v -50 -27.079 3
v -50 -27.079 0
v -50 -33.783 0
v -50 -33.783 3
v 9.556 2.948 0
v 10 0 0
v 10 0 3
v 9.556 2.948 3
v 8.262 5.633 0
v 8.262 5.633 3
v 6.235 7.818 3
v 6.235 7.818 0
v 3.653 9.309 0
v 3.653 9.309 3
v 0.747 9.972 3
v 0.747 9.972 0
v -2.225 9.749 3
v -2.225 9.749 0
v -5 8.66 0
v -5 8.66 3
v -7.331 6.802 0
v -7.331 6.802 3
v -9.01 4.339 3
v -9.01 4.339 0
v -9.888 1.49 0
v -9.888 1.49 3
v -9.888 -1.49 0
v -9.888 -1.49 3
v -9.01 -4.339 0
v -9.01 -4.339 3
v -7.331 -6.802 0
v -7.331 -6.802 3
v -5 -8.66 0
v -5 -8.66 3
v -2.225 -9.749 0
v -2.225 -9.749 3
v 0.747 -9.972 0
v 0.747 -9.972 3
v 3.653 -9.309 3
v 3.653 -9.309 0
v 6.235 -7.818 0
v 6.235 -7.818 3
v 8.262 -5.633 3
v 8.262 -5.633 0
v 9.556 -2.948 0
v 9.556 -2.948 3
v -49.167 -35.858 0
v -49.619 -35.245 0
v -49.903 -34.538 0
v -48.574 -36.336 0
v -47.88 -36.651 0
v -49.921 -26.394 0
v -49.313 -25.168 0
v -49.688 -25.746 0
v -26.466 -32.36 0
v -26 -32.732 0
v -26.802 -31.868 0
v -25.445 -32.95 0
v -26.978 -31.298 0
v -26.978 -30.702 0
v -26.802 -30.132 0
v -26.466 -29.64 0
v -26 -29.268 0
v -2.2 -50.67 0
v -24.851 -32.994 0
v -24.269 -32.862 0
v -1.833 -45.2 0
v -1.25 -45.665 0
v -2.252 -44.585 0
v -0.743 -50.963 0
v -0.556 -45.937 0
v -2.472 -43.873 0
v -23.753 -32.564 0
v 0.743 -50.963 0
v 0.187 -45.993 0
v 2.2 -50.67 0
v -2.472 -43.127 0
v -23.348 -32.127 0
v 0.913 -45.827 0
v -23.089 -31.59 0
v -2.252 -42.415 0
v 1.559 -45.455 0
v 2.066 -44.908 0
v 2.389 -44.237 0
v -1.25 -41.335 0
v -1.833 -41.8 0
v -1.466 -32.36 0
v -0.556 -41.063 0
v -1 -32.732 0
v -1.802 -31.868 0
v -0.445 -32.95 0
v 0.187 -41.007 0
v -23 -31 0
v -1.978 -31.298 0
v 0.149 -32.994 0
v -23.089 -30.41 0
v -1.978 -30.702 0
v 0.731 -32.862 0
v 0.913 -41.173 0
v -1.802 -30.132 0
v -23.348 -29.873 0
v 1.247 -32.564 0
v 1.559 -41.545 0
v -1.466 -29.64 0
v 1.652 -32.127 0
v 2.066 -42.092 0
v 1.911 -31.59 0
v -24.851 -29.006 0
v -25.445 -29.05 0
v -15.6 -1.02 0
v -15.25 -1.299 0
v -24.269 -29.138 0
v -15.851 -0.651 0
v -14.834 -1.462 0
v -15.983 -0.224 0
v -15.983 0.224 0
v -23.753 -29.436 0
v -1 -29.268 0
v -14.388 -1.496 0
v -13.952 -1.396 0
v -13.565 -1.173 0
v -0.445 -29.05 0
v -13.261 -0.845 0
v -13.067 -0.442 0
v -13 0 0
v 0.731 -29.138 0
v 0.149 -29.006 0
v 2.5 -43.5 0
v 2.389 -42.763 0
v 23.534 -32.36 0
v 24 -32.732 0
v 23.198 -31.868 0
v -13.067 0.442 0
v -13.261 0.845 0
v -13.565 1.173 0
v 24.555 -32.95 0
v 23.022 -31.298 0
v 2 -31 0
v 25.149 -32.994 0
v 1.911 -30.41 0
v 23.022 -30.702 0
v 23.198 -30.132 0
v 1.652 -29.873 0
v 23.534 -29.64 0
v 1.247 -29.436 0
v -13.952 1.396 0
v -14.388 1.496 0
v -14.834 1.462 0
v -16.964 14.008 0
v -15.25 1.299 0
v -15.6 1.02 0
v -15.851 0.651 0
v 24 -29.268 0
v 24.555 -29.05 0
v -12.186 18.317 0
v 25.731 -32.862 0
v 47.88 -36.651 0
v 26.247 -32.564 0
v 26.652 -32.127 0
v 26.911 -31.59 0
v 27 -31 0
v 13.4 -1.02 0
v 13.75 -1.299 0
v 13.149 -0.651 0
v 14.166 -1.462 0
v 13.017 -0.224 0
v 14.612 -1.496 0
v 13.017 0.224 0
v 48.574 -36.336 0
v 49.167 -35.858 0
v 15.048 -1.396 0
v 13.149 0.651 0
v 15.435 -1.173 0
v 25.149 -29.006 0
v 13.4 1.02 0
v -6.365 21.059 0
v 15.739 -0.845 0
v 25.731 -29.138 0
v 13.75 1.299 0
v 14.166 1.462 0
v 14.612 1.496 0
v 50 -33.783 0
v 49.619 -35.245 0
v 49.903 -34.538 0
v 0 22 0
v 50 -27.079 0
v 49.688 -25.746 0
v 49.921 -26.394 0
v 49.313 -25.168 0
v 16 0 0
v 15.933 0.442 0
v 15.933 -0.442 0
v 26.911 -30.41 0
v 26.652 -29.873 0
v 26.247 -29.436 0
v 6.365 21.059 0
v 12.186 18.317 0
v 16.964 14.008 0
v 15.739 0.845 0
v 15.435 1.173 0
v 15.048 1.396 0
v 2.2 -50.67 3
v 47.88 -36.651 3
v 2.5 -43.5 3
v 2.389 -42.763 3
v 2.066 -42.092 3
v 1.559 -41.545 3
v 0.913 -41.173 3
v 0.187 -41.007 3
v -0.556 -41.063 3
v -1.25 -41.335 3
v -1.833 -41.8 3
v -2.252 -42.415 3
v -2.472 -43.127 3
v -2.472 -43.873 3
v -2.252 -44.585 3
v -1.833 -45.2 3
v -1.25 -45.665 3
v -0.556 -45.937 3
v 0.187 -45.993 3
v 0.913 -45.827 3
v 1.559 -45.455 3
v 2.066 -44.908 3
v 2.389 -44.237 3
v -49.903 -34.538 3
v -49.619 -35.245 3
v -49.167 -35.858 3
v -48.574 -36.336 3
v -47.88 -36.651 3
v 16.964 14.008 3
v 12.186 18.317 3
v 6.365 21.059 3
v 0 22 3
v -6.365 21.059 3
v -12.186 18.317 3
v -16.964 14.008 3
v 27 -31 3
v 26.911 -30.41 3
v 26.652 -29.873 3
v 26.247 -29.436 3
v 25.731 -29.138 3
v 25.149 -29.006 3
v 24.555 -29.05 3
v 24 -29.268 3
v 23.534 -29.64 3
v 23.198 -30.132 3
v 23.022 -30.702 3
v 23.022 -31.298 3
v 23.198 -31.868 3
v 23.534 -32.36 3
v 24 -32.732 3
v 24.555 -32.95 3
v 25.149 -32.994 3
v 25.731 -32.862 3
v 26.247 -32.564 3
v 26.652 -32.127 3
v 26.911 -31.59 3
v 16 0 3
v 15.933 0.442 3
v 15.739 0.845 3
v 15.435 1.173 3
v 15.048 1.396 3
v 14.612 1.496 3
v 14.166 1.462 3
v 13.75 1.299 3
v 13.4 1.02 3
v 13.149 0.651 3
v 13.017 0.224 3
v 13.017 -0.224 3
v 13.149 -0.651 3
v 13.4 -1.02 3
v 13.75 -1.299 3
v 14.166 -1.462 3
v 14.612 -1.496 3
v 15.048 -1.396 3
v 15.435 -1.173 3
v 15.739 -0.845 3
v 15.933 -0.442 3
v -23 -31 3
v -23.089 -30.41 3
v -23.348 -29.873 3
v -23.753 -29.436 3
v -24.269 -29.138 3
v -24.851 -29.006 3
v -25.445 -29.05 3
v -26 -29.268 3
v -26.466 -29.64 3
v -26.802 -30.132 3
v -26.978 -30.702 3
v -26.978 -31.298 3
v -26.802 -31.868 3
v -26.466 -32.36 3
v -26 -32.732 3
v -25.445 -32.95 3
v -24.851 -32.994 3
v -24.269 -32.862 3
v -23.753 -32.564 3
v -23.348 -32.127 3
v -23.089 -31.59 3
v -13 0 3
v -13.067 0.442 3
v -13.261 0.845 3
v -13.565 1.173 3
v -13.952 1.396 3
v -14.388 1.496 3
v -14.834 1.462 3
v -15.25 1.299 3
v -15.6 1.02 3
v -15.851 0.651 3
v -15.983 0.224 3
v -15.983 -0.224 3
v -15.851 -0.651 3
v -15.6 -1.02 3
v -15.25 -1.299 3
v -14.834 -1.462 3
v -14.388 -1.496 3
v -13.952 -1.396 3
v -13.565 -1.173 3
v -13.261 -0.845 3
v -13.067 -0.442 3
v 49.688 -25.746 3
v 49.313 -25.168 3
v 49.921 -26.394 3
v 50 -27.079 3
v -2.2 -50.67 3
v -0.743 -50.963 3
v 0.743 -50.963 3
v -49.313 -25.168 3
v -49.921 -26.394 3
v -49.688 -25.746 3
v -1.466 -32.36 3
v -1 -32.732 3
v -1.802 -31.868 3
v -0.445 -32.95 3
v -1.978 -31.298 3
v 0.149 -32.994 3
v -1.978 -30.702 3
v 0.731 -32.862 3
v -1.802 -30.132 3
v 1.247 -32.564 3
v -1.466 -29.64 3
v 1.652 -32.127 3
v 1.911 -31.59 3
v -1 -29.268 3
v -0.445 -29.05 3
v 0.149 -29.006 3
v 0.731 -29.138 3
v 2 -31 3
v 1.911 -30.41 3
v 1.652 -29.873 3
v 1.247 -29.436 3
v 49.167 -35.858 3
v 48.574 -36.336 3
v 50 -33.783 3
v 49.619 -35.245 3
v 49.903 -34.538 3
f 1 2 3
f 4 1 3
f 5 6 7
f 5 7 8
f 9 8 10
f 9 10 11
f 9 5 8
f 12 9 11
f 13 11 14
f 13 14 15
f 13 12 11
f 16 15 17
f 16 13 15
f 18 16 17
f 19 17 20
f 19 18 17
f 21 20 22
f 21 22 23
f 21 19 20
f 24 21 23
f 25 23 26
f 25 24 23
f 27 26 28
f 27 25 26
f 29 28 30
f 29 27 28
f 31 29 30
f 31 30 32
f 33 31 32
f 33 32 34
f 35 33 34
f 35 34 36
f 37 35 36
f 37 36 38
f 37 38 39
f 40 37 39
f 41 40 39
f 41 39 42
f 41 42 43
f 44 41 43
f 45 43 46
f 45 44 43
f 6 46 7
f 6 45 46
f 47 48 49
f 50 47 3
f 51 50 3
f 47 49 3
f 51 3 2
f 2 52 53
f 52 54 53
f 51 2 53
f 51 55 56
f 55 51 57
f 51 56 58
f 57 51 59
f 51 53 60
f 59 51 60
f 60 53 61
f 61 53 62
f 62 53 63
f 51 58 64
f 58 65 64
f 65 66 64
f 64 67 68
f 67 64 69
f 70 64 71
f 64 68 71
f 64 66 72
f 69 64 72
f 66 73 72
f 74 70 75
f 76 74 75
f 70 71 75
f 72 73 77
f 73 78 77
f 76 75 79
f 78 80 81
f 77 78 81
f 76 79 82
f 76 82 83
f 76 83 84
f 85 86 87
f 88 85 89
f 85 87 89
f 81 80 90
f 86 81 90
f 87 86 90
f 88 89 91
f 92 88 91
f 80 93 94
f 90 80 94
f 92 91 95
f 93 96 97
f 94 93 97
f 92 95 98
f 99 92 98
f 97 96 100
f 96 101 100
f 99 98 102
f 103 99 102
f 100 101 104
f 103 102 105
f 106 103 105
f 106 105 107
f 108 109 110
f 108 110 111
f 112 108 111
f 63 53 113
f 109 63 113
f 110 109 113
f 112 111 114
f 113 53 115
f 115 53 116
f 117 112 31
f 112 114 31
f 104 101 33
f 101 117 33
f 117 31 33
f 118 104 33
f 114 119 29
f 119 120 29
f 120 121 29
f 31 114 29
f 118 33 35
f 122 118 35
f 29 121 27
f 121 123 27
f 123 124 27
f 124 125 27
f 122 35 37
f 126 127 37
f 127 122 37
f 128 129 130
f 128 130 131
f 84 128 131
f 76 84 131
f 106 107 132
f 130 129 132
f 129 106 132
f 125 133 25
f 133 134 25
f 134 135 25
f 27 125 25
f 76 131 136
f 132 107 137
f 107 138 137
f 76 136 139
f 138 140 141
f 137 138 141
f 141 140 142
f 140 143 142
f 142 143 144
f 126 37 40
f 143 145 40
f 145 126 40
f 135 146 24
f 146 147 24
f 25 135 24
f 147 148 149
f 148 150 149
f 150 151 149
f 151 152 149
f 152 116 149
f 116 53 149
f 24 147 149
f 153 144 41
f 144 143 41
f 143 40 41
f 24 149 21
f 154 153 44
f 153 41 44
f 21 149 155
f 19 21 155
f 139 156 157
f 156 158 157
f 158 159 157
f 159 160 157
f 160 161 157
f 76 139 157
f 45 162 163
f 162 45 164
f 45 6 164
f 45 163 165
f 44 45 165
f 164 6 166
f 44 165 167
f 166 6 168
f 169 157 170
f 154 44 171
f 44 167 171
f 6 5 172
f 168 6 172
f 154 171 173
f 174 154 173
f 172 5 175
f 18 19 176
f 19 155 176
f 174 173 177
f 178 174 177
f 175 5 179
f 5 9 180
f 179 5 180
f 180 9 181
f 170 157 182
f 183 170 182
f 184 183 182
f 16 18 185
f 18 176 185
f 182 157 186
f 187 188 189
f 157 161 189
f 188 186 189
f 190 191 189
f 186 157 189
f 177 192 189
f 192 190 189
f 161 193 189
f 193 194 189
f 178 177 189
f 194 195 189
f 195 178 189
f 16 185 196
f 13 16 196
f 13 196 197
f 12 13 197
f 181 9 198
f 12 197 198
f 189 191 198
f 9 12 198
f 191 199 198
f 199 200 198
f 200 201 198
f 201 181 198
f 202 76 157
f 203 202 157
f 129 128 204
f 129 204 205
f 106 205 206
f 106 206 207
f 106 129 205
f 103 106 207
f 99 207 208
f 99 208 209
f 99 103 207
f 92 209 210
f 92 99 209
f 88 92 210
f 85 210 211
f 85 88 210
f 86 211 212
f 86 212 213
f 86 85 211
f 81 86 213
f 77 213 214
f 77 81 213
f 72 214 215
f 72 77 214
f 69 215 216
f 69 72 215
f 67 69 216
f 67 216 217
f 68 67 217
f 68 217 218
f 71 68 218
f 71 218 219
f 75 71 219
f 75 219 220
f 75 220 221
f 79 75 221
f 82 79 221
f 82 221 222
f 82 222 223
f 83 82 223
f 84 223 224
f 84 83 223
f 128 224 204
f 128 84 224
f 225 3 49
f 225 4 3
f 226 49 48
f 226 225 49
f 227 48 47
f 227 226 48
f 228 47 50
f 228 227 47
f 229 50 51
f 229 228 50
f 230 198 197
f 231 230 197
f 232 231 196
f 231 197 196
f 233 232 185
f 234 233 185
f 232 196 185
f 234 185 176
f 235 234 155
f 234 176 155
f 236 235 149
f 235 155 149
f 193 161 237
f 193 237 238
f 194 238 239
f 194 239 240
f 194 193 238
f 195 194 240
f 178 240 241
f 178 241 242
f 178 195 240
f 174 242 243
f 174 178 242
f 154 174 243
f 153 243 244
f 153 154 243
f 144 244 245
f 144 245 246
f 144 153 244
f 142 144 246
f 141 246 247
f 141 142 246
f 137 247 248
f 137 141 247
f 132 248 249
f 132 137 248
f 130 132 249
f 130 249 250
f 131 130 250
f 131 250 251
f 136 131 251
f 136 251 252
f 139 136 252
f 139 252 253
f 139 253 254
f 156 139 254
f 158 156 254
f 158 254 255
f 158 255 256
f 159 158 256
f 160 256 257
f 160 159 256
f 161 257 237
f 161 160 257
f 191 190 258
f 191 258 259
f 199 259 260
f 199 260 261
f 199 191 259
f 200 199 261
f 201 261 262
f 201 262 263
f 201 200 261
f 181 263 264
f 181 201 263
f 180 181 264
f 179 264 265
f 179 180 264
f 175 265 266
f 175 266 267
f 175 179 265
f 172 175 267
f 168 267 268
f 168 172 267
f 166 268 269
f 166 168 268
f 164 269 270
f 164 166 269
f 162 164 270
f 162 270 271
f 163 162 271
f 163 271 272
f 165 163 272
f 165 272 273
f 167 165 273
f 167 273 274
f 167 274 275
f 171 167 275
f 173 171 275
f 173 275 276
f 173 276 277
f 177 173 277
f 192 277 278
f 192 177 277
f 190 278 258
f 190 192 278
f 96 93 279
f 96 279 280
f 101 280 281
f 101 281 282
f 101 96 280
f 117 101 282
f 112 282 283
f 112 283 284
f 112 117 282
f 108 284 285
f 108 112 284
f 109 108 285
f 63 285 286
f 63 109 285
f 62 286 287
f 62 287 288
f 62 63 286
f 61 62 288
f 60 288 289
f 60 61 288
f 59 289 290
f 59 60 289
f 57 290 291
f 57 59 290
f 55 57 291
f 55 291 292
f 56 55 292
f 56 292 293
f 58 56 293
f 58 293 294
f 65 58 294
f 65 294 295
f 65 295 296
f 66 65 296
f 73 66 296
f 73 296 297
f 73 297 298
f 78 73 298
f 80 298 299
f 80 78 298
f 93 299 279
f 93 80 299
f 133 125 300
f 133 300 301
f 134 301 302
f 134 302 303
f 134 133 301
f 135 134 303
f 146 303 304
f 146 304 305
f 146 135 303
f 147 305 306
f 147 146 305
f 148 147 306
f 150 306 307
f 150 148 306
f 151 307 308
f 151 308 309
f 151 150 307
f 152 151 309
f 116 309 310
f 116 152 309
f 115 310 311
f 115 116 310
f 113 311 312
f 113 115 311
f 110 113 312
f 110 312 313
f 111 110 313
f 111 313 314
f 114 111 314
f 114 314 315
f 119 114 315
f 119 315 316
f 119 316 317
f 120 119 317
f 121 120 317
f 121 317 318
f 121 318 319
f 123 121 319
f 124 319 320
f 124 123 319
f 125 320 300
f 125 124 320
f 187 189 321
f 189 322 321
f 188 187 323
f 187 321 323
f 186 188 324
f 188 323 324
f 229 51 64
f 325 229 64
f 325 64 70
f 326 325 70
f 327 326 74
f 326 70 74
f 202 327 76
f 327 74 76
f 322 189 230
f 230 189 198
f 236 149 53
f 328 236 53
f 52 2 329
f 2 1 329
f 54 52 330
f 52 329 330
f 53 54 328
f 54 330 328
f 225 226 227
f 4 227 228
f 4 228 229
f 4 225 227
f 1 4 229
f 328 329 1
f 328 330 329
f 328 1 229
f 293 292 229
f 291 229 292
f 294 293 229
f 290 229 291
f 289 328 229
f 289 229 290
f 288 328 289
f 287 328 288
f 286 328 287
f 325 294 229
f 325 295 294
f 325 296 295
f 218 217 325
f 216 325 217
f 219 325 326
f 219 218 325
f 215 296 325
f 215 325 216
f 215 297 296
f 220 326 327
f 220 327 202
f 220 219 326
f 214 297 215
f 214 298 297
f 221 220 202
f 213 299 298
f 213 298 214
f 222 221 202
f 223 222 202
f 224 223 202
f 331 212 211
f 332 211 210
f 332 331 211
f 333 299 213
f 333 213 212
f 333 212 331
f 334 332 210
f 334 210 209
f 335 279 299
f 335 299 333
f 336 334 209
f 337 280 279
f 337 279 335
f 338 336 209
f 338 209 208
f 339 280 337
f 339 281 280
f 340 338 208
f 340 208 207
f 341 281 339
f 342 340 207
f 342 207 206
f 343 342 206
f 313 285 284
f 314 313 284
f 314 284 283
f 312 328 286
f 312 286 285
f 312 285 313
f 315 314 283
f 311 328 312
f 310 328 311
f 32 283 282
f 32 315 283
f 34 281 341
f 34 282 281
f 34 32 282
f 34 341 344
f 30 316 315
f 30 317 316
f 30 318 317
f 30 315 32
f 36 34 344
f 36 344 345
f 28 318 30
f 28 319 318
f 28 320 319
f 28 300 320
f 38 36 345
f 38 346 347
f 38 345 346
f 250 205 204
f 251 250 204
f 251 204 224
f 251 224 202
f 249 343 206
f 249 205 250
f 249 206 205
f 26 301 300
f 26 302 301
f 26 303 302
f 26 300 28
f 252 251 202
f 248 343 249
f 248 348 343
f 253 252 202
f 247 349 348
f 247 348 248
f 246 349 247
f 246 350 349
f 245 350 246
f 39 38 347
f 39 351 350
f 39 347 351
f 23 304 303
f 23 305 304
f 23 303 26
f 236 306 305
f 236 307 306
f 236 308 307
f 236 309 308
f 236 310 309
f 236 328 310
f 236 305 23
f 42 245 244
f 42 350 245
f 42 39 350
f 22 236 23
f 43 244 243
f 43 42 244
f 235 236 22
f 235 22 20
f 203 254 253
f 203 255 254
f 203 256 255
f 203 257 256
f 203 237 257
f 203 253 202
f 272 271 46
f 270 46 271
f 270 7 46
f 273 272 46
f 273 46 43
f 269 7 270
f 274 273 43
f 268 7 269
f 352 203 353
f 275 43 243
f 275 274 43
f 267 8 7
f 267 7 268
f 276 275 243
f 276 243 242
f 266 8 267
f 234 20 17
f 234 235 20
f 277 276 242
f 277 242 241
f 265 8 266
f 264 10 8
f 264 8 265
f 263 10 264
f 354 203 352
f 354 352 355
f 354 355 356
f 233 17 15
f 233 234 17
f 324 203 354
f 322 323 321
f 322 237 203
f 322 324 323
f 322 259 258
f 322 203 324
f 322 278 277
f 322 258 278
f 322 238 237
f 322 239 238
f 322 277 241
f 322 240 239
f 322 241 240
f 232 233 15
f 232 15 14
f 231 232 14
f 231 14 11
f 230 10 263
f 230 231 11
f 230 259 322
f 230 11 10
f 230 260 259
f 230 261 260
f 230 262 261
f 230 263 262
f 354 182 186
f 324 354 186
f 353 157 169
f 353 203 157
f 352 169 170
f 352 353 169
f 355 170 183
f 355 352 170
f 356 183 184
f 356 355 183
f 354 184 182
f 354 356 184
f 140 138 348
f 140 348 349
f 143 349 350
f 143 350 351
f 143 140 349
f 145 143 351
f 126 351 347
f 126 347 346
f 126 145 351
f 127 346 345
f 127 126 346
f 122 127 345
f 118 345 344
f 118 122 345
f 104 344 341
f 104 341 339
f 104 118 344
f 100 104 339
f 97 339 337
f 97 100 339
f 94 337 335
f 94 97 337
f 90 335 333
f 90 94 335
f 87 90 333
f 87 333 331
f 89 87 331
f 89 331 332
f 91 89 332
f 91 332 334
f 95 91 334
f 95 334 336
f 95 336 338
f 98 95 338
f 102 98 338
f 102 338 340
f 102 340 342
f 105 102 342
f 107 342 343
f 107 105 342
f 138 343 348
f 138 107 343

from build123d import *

# Parameters (mm, degrees)
SKETCH1_R           = 2
SKETCH1_R_2         = 2.5
SKETCH1_R_3         = 1.5
SKETCH1_R_4         = 10
BOSS_EXTRUDE1_DEPTH = 3
FILLET1_R           = 3


with BuildPart() as part:
    # Sketch1 → Boss-Extrude1 (new body)
    with BuildSketch(Plane.XY):
        with BuildLine():
            Line((-50, -26), (-50, -36))
            Line((-50, -36), (-2.200488998, -50.66992665))
            ThreePointArc((-2.200488998, -50.66992665), (0, -51), (2.200488998, -50.66992665))
            Line((2.200488998, -50.66992665), (50, -36))
            Line((50, -36), (50, -26))
            Line((50, -26), (16.964082686, 14.00785132))
            ThreePointArc((16.964082686, 14.00785132), (0, 22), (-16.964082686, 14.00785132))
            Line((-16.964082686, 14.00785132), (-50, -26))
        make_face()
        with Locations((-25, -31)):
            Circle(SKETCH1_R, mode=Mode.SUBTRACT)
        with Locations((0, -31)):
            Circle(SKETCH1_R, mode=Mode.SUBTRACT)
        with Locations((25, -31)):
            Circle(SKETCH1_R, mode=Mode.SUBTRACT)
        with Locations((0, -43.5)):
            Circle(SKETCH1_R_2, mode=Mode.SUBTRACT)
        with Locations((14.5, 0)):
            Circle(SKETCH1_R_3, mode=Mode.SUBTRACT)
        Circle(SKETCH1_R_4, mode=Mode.SUBTRACT)
        with Locations((-14.5, 0)):
            Circle(SKETCH1_R_3, mode=Mode.SUBTRACT)
    extrude(amount=BOSS_EXTRUDE1_DEPTH)

    # Fillet1
    fillet1_edges = [part.edges().sort_by_distance(p)[0] for p in [
        (-50, -36, 1.5),
        (-50, -26, 1.5),
        (50, -26, 1.5),
        (50, -36, 1.5),
    ]]
    fillet(fillet1_edges, radius=FILLET1_R)


solid = part.part
